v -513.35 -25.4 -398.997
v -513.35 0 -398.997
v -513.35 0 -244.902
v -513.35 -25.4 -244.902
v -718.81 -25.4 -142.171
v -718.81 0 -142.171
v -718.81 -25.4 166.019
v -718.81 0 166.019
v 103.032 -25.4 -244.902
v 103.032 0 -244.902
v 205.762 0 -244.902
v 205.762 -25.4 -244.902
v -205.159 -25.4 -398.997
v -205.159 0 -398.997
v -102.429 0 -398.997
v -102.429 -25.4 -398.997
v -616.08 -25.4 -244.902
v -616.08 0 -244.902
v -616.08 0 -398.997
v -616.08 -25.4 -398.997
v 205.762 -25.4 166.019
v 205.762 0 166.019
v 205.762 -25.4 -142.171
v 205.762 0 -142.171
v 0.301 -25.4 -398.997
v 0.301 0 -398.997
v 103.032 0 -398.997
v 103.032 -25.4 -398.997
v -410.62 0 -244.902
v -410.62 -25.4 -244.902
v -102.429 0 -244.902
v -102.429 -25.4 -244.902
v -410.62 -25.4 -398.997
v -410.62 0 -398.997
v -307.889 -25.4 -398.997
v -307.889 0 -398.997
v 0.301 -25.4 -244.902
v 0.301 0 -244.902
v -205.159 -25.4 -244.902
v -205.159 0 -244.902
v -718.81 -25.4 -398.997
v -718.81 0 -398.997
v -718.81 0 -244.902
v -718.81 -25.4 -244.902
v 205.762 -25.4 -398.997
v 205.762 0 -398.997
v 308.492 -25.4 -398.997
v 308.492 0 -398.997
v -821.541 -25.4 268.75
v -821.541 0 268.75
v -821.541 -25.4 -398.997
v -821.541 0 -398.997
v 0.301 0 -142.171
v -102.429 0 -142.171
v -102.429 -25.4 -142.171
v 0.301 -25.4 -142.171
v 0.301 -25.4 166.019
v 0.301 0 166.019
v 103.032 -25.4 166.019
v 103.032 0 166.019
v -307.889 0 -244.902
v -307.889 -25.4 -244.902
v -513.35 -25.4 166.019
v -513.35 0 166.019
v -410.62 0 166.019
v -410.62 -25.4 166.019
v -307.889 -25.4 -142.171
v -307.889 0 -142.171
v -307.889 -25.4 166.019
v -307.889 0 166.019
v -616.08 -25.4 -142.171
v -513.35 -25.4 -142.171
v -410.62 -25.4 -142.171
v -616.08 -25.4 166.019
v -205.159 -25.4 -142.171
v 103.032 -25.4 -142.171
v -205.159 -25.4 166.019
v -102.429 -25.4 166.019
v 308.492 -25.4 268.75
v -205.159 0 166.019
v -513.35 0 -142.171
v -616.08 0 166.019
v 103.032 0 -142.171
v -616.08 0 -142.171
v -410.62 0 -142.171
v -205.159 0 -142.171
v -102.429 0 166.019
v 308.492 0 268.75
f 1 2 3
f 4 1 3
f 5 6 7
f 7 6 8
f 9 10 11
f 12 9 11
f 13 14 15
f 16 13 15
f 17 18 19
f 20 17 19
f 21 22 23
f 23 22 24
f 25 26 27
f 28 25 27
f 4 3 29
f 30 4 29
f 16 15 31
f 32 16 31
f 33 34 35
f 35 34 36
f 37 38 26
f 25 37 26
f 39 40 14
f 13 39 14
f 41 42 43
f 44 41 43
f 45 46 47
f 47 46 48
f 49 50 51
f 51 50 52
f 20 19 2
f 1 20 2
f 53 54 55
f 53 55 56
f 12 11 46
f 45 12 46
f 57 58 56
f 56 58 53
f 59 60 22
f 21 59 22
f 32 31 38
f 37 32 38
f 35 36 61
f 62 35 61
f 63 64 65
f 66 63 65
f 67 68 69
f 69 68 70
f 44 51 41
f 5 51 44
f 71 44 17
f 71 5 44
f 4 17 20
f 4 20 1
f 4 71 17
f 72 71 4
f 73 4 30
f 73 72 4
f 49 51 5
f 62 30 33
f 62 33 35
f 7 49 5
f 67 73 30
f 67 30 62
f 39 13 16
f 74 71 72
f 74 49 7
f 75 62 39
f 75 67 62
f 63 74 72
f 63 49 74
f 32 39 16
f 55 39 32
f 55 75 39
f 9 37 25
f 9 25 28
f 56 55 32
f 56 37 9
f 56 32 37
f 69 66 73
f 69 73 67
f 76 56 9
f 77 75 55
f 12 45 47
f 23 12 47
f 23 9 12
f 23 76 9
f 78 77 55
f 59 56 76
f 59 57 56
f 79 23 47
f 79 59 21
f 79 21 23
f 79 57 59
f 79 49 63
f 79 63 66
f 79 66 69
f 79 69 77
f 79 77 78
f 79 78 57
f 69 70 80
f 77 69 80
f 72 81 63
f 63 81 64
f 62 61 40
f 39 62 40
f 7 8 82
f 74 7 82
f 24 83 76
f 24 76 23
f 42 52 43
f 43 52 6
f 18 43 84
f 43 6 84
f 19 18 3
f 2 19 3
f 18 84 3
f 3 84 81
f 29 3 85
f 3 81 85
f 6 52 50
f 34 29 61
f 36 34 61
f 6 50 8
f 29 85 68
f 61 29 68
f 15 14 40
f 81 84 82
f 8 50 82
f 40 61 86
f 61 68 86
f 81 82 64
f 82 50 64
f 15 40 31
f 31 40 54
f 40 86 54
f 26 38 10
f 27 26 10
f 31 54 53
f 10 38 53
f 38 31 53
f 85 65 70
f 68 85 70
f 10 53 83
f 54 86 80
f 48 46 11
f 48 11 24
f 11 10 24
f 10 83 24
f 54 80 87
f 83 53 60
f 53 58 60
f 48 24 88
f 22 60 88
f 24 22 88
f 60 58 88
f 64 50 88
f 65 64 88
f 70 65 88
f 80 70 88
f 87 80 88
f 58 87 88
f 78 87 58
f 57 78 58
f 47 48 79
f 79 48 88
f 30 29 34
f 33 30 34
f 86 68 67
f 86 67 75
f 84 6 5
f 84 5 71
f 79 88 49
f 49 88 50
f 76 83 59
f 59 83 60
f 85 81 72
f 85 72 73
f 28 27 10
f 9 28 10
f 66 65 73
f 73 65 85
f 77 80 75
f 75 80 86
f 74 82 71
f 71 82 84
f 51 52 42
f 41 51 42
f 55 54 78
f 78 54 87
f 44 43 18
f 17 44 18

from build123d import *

# Parameters (mm, degrees)
F0_W     = 102.730258709
F0_H     = 102.730258709
F0_H_2   = 308.1907761271
F0_H_3   = 154.0953880636
F1_DEPTH = 25.4


# Not quite as in the source:
# - a feature names something its author has since deleted; it is built from what else it names


with BuildPart() as f1:
    # F0 (on Front) → F1 (new body)
    with BuildSketch(Plane.XZ):
        with Locations((-770.1755237305, 217.3844415066)):
            Rectangle(F0_W, F0_H)
        with Locations((-770.1755237305, 11.9239240885)):
            Rectangle(F0_W, F0_H_2)
        with Locations((-770.1755237305, -193.5365933296)):
            Rectangle(F0_W, F0_H)
        with Locations((-770.1755237305, -321.9494167159)):
            Rectangle(F0_W, F0_H_3)
        with Locations((-564.7150063124, -193.5365933296)):
            Rectangle(F0_W, F0_H)
        with Locations((-564.7150063124, 11.9239240885)):
            Rectangle(F0_W, F0_H_2)
        with Locations((-564.7150063124, 217.3844415066)):
            Rectangle(F0_W, F0_H)
        with Locations((-359.2544888943, 217.3844415066)):
            Rectangle(F0_W, F0_H)
        with Locations((-359.2544888943, 11.9239240885)):
            Rectangle(F0_W, F0_H_2)
        with Locations((-359.2544888943, -321.9494167159)):
            Rectangle(F0_W, F0_H_3)
        with Locations((-564.7150063124, -321.9494167159)):
            Rectangle(F0_W, F0_H_3)
        with Locations((-359.2544888943, -193.5365933296)):
            Rectangle(F0_W, F0_H)
        with Locations((-153.7939714763, -193.5365933296)):
            Rectangle(F0_W, F0_H)
        with Locations((-153.7939714763, 217.3844415066)):
            Rectangle(F0_W, F0_H)
        with Locations((-153.7939714763, -321.9494167159)):
            Rectangle(F0_W, F0_H_3)
        with Locations((51.6665459418, -321.9494167159)):
            Rectangle(F0_W, F0_H_3)
        with Locations((51.6665459418, -193.5365933296)):
            Rectangle(F0_W, F0_H)
        with Locations((51.6665459418, 11.9239240885)):
            Rectangle(F0_W, F0_H_2)
        with Locations((-153.7939714763, 11.9239240885)):
            Rectangle(F0_W, F0_H_2)
        with Locations((51.6665459418, 217.3844415066)):
            Rectangle(F0_W, F0_H)
        with Locations((257.1270633599, 217.3844415066)):
            Rectangle(F0_W, F0_H)
        with Locations((257.1270633599, 11.9239240885)):
            Rectangle(F0_W, F0_H_2)
        with Locations((257.1270633599, -193.5365933296)):
            Rectangle(F0_W, F0_H)
        with Locations((257.1270633599, -321.9494167159)):
            Rectangle(F0_W, F0_H_3)
        with Locations((-667.4452650214, 217.3844415066)):
            Rectangle(F0_W, F0_H)
        with Locations((-667.4452650214, -193.5365933296)):
            Rectangle(F0_W, F0_H)
        with Locations((-461.9847476034, -193.5365933296)):
            Rectangle(F0_W, F0_H)
        with Locations((-461.9847476034, 217.3844415066)):
            Rectangle(F0_W, F0_H)
        with Locations((-256.5242301853, 217.3844415066)):
            Rectangle(F0_W, F0_H)
        with Locations((-256.5242301853, -193.5365933296)):
            Rectangle(F0_W, F0_H)
        with Locations((-51.0637127672, -193.5365933296)):
            Rectangle(F0_W, F0_H)
        with Locations((-51.0637127672, 217.3844415066)):
            Rectangle(F0_W, F0_H)
        with Locations((154.3968046508, 217.3844415066)):
            Rectangle(F0_W, F0_H)
        with Locations((154.3968046508, -193.5365933296)):
            Rectangle(F0_W, F0_H)
    extrude(amount=F1_DEPTH)


solid = f1.part
